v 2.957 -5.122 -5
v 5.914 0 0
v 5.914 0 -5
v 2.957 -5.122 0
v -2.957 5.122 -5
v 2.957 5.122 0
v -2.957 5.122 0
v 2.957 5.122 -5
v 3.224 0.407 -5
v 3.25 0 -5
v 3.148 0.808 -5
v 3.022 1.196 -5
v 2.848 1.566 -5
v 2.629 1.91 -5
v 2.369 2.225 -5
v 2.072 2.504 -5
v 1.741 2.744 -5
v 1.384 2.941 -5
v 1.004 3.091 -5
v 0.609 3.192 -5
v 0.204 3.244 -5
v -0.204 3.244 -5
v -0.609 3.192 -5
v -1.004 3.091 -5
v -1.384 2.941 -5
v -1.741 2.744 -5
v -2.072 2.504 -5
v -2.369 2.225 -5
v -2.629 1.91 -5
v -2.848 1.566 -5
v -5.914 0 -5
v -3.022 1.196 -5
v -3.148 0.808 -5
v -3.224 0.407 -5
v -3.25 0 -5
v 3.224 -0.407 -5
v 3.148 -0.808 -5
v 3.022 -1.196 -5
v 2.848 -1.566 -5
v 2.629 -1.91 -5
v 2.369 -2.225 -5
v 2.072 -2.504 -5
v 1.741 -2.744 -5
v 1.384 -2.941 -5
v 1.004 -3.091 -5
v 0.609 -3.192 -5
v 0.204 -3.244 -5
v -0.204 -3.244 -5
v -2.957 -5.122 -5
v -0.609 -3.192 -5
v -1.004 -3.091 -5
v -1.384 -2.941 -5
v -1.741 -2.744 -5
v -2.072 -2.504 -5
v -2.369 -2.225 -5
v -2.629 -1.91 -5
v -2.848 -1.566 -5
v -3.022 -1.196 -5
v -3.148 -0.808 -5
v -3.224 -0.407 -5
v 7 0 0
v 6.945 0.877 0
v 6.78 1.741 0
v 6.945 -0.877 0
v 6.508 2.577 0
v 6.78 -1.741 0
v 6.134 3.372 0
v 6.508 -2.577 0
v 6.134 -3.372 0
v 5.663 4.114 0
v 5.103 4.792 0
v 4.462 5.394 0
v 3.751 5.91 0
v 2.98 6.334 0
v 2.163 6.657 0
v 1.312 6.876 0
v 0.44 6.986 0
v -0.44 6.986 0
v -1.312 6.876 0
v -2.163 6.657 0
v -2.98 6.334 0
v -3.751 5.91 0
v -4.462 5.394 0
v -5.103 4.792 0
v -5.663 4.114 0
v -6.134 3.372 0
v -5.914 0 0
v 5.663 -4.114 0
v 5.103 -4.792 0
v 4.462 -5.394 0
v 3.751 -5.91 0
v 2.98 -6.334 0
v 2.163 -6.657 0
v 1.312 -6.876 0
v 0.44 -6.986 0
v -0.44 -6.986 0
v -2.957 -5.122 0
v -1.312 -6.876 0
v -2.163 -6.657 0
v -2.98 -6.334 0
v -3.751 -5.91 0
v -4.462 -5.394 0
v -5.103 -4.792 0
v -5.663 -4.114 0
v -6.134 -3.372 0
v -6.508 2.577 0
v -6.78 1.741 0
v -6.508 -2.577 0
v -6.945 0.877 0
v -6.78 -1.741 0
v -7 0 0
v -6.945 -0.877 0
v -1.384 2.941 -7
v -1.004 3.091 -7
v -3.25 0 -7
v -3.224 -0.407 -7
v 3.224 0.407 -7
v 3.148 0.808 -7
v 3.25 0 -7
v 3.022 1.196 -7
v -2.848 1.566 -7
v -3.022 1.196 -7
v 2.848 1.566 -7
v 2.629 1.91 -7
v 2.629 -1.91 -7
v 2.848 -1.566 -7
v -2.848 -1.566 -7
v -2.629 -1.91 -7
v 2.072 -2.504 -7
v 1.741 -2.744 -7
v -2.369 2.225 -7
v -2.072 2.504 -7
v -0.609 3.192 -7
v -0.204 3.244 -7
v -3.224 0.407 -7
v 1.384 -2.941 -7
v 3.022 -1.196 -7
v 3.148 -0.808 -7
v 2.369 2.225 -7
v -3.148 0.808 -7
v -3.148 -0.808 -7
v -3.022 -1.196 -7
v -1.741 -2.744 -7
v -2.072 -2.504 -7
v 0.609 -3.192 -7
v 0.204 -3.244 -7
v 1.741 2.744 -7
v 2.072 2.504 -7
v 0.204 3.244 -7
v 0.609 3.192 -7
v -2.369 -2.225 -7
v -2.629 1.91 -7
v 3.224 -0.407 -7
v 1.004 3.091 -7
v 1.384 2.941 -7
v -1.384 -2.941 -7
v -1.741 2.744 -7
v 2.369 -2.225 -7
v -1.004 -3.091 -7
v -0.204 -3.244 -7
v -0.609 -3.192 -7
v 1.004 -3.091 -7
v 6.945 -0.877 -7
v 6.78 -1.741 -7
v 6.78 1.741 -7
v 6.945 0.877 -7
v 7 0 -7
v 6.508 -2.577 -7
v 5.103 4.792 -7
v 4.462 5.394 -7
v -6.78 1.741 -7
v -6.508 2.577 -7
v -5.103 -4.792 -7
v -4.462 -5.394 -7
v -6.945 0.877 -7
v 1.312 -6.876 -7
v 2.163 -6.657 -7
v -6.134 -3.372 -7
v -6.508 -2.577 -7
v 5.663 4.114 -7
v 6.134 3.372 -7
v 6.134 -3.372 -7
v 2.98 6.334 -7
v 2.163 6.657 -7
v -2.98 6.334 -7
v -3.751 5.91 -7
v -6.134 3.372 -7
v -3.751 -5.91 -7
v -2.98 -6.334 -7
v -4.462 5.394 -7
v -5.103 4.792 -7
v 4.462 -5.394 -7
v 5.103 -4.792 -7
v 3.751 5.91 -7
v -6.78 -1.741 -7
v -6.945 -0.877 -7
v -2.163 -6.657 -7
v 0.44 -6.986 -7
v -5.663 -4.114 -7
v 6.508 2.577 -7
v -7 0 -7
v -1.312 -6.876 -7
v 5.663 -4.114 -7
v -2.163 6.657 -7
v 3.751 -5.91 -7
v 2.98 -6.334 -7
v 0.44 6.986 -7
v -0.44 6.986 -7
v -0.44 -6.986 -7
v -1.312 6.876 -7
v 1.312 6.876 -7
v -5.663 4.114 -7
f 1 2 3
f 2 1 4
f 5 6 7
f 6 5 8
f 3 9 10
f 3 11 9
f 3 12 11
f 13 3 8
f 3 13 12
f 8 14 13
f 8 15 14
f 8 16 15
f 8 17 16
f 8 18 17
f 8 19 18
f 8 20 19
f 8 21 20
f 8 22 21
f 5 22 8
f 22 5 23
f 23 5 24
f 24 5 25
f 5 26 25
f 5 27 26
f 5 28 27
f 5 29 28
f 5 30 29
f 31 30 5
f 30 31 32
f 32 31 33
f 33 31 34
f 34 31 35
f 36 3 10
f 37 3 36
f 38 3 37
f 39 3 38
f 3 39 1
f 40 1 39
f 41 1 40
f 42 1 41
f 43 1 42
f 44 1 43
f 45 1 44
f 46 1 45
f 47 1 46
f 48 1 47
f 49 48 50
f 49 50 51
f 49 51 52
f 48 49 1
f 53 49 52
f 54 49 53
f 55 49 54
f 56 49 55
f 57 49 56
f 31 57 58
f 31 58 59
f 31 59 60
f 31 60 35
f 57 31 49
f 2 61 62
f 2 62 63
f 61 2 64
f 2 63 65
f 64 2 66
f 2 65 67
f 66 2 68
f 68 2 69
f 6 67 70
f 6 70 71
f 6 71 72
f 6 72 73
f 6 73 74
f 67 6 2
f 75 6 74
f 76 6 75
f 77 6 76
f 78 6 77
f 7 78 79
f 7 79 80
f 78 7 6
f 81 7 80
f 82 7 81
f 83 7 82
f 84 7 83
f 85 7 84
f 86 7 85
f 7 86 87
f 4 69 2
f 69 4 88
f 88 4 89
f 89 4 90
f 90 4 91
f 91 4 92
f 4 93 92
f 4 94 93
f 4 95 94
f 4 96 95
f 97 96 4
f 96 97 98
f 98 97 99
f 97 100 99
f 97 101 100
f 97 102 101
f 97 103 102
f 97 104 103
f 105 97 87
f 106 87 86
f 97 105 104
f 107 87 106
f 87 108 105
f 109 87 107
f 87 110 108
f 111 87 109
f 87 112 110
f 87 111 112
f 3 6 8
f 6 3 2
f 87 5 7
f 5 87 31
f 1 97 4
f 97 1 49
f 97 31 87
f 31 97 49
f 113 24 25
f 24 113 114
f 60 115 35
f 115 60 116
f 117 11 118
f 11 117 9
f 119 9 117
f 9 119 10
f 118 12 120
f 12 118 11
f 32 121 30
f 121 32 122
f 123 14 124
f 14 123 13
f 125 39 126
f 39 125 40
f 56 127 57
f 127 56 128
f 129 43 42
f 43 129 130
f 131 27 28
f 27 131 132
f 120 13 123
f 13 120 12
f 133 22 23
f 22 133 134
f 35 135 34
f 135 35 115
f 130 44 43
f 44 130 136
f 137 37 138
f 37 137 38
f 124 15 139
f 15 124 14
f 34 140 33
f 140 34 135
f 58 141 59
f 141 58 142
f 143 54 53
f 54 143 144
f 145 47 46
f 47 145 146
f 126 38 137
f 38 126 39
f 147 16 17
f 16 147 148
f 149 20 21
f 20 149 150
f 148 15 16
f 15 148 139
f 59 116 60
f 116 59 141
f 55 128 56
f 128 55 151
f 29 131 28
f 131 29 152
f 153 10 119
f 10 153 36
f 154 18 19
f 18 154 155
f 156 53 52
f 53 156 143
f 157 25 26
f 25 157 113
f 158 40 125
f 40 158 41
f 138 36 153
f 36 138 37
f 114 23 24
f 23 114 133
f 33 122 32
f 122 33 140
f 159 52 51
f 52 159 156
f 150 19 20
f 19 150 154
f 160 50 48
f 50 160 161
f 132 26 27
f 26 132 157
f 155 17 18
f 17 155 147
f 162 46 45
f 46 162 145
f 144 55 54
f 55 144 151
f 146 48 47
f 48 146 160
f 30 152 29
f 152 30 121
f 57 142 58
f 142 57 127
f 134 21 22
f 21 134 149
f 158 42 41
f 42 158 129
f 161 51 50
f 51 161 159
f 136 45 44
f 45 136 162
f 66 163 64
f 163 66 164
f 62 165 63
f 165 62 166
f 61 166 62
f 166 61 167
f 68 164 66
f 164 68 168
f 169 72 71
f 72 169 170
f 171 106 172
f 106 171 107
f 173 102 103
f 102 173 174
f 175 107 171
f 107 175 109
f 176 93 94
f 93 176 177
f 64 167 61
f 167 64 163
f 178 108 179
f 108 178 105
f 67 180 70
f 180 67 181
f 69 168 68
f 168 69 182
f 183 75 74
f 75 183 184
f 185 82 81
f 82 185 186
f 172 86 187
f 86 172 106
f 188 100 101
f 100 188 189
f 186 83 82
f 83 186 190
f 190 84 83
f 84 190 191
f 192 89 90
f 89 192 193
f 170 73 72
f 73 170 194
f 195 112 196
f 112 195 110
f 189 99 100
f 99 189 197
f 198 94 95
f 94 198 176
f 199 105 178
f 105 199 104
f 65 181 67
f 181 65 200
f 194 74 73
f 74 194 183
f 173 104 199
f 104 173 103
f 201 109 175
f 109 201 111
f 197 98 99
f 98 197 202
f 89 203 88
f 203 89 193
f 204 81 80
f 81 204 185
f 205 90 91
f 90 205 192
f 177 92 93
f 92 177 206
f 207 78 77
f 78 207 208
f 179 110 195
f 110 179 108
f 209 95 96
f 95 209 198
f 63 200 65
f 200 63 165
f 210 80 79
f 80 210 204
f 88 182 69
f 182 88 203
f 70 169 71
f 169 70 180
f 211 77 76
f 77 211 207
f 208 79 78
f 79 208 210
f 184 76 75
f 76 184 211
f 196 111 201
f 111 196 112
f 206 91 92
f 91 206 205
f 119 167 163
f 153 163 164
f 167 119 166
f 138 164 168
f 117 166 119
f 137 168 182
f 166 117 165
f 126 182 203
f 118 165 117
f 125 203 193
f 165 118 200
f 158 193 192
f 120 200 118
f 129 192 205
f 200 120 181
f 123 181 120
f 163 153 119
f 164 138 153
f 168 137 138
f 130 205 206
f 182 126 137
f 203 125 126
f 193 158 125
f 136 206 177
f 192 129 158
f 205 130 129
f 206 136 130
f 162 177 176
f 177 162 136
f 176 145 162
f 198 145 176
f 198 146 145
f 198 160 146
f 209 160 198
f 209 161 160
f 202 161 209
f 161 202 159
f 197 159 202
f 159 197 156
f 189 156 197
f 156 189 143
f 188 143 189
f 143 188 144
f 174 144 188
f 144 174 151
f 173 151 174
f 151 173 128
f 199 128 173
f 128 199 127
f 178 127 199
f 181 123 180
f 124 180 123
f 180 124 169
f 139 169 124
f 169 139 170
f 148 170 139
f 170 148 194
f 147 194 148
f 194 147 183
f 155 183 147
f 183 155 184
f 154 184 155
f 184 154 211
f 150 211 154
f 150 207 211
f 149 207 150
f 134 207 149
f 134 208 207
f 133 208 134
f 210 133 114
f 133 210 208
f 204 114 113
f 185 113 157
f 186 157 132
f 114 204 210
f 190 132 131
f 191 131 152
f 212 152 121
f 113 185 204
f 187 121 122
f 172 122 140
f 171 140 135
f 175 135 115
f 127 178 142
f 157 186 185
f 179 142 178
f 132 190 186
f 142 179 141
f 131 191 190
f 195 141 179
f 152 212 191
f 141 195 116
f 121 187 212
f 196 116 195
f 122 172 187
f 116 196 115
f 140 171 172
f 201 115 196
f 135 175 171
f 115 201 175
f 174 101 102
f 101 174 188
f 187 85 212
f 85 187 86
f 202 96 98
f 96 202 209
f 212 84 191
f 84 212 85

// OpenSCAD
$fn = 50;


difference() {
	union() {
		translate(v = [0, 0, -7.0000000000]) {
			cylinder(h = 7.0000000000, r = 7.0000000000);
		}
	}
	union() {
		translate(v = [0, 0, 0]) {
			rotate(a = [0, 0, 0]) {
				difference() {
					union() {
						translate(v = [0, 0, -5]) {
							linear_extrude(height = 5) {
								polygon(points = [[5.9142500000, 0.0000000000], [2.9571250000, 5.1218907443], [-2.9571250000, 5.1218907443], [-5.9142500000, 0.0000000000], [-2.9571250000, -5.1218907443], [2.9571250000, -5.1218907443]]);
							}
						}
					}
					union();
				}
			}
		}
		#translate(v = [0, 0, -100.0000000000]) {
			cylinder(h = 200, r = 3.2500000000);
		}
	}
}
